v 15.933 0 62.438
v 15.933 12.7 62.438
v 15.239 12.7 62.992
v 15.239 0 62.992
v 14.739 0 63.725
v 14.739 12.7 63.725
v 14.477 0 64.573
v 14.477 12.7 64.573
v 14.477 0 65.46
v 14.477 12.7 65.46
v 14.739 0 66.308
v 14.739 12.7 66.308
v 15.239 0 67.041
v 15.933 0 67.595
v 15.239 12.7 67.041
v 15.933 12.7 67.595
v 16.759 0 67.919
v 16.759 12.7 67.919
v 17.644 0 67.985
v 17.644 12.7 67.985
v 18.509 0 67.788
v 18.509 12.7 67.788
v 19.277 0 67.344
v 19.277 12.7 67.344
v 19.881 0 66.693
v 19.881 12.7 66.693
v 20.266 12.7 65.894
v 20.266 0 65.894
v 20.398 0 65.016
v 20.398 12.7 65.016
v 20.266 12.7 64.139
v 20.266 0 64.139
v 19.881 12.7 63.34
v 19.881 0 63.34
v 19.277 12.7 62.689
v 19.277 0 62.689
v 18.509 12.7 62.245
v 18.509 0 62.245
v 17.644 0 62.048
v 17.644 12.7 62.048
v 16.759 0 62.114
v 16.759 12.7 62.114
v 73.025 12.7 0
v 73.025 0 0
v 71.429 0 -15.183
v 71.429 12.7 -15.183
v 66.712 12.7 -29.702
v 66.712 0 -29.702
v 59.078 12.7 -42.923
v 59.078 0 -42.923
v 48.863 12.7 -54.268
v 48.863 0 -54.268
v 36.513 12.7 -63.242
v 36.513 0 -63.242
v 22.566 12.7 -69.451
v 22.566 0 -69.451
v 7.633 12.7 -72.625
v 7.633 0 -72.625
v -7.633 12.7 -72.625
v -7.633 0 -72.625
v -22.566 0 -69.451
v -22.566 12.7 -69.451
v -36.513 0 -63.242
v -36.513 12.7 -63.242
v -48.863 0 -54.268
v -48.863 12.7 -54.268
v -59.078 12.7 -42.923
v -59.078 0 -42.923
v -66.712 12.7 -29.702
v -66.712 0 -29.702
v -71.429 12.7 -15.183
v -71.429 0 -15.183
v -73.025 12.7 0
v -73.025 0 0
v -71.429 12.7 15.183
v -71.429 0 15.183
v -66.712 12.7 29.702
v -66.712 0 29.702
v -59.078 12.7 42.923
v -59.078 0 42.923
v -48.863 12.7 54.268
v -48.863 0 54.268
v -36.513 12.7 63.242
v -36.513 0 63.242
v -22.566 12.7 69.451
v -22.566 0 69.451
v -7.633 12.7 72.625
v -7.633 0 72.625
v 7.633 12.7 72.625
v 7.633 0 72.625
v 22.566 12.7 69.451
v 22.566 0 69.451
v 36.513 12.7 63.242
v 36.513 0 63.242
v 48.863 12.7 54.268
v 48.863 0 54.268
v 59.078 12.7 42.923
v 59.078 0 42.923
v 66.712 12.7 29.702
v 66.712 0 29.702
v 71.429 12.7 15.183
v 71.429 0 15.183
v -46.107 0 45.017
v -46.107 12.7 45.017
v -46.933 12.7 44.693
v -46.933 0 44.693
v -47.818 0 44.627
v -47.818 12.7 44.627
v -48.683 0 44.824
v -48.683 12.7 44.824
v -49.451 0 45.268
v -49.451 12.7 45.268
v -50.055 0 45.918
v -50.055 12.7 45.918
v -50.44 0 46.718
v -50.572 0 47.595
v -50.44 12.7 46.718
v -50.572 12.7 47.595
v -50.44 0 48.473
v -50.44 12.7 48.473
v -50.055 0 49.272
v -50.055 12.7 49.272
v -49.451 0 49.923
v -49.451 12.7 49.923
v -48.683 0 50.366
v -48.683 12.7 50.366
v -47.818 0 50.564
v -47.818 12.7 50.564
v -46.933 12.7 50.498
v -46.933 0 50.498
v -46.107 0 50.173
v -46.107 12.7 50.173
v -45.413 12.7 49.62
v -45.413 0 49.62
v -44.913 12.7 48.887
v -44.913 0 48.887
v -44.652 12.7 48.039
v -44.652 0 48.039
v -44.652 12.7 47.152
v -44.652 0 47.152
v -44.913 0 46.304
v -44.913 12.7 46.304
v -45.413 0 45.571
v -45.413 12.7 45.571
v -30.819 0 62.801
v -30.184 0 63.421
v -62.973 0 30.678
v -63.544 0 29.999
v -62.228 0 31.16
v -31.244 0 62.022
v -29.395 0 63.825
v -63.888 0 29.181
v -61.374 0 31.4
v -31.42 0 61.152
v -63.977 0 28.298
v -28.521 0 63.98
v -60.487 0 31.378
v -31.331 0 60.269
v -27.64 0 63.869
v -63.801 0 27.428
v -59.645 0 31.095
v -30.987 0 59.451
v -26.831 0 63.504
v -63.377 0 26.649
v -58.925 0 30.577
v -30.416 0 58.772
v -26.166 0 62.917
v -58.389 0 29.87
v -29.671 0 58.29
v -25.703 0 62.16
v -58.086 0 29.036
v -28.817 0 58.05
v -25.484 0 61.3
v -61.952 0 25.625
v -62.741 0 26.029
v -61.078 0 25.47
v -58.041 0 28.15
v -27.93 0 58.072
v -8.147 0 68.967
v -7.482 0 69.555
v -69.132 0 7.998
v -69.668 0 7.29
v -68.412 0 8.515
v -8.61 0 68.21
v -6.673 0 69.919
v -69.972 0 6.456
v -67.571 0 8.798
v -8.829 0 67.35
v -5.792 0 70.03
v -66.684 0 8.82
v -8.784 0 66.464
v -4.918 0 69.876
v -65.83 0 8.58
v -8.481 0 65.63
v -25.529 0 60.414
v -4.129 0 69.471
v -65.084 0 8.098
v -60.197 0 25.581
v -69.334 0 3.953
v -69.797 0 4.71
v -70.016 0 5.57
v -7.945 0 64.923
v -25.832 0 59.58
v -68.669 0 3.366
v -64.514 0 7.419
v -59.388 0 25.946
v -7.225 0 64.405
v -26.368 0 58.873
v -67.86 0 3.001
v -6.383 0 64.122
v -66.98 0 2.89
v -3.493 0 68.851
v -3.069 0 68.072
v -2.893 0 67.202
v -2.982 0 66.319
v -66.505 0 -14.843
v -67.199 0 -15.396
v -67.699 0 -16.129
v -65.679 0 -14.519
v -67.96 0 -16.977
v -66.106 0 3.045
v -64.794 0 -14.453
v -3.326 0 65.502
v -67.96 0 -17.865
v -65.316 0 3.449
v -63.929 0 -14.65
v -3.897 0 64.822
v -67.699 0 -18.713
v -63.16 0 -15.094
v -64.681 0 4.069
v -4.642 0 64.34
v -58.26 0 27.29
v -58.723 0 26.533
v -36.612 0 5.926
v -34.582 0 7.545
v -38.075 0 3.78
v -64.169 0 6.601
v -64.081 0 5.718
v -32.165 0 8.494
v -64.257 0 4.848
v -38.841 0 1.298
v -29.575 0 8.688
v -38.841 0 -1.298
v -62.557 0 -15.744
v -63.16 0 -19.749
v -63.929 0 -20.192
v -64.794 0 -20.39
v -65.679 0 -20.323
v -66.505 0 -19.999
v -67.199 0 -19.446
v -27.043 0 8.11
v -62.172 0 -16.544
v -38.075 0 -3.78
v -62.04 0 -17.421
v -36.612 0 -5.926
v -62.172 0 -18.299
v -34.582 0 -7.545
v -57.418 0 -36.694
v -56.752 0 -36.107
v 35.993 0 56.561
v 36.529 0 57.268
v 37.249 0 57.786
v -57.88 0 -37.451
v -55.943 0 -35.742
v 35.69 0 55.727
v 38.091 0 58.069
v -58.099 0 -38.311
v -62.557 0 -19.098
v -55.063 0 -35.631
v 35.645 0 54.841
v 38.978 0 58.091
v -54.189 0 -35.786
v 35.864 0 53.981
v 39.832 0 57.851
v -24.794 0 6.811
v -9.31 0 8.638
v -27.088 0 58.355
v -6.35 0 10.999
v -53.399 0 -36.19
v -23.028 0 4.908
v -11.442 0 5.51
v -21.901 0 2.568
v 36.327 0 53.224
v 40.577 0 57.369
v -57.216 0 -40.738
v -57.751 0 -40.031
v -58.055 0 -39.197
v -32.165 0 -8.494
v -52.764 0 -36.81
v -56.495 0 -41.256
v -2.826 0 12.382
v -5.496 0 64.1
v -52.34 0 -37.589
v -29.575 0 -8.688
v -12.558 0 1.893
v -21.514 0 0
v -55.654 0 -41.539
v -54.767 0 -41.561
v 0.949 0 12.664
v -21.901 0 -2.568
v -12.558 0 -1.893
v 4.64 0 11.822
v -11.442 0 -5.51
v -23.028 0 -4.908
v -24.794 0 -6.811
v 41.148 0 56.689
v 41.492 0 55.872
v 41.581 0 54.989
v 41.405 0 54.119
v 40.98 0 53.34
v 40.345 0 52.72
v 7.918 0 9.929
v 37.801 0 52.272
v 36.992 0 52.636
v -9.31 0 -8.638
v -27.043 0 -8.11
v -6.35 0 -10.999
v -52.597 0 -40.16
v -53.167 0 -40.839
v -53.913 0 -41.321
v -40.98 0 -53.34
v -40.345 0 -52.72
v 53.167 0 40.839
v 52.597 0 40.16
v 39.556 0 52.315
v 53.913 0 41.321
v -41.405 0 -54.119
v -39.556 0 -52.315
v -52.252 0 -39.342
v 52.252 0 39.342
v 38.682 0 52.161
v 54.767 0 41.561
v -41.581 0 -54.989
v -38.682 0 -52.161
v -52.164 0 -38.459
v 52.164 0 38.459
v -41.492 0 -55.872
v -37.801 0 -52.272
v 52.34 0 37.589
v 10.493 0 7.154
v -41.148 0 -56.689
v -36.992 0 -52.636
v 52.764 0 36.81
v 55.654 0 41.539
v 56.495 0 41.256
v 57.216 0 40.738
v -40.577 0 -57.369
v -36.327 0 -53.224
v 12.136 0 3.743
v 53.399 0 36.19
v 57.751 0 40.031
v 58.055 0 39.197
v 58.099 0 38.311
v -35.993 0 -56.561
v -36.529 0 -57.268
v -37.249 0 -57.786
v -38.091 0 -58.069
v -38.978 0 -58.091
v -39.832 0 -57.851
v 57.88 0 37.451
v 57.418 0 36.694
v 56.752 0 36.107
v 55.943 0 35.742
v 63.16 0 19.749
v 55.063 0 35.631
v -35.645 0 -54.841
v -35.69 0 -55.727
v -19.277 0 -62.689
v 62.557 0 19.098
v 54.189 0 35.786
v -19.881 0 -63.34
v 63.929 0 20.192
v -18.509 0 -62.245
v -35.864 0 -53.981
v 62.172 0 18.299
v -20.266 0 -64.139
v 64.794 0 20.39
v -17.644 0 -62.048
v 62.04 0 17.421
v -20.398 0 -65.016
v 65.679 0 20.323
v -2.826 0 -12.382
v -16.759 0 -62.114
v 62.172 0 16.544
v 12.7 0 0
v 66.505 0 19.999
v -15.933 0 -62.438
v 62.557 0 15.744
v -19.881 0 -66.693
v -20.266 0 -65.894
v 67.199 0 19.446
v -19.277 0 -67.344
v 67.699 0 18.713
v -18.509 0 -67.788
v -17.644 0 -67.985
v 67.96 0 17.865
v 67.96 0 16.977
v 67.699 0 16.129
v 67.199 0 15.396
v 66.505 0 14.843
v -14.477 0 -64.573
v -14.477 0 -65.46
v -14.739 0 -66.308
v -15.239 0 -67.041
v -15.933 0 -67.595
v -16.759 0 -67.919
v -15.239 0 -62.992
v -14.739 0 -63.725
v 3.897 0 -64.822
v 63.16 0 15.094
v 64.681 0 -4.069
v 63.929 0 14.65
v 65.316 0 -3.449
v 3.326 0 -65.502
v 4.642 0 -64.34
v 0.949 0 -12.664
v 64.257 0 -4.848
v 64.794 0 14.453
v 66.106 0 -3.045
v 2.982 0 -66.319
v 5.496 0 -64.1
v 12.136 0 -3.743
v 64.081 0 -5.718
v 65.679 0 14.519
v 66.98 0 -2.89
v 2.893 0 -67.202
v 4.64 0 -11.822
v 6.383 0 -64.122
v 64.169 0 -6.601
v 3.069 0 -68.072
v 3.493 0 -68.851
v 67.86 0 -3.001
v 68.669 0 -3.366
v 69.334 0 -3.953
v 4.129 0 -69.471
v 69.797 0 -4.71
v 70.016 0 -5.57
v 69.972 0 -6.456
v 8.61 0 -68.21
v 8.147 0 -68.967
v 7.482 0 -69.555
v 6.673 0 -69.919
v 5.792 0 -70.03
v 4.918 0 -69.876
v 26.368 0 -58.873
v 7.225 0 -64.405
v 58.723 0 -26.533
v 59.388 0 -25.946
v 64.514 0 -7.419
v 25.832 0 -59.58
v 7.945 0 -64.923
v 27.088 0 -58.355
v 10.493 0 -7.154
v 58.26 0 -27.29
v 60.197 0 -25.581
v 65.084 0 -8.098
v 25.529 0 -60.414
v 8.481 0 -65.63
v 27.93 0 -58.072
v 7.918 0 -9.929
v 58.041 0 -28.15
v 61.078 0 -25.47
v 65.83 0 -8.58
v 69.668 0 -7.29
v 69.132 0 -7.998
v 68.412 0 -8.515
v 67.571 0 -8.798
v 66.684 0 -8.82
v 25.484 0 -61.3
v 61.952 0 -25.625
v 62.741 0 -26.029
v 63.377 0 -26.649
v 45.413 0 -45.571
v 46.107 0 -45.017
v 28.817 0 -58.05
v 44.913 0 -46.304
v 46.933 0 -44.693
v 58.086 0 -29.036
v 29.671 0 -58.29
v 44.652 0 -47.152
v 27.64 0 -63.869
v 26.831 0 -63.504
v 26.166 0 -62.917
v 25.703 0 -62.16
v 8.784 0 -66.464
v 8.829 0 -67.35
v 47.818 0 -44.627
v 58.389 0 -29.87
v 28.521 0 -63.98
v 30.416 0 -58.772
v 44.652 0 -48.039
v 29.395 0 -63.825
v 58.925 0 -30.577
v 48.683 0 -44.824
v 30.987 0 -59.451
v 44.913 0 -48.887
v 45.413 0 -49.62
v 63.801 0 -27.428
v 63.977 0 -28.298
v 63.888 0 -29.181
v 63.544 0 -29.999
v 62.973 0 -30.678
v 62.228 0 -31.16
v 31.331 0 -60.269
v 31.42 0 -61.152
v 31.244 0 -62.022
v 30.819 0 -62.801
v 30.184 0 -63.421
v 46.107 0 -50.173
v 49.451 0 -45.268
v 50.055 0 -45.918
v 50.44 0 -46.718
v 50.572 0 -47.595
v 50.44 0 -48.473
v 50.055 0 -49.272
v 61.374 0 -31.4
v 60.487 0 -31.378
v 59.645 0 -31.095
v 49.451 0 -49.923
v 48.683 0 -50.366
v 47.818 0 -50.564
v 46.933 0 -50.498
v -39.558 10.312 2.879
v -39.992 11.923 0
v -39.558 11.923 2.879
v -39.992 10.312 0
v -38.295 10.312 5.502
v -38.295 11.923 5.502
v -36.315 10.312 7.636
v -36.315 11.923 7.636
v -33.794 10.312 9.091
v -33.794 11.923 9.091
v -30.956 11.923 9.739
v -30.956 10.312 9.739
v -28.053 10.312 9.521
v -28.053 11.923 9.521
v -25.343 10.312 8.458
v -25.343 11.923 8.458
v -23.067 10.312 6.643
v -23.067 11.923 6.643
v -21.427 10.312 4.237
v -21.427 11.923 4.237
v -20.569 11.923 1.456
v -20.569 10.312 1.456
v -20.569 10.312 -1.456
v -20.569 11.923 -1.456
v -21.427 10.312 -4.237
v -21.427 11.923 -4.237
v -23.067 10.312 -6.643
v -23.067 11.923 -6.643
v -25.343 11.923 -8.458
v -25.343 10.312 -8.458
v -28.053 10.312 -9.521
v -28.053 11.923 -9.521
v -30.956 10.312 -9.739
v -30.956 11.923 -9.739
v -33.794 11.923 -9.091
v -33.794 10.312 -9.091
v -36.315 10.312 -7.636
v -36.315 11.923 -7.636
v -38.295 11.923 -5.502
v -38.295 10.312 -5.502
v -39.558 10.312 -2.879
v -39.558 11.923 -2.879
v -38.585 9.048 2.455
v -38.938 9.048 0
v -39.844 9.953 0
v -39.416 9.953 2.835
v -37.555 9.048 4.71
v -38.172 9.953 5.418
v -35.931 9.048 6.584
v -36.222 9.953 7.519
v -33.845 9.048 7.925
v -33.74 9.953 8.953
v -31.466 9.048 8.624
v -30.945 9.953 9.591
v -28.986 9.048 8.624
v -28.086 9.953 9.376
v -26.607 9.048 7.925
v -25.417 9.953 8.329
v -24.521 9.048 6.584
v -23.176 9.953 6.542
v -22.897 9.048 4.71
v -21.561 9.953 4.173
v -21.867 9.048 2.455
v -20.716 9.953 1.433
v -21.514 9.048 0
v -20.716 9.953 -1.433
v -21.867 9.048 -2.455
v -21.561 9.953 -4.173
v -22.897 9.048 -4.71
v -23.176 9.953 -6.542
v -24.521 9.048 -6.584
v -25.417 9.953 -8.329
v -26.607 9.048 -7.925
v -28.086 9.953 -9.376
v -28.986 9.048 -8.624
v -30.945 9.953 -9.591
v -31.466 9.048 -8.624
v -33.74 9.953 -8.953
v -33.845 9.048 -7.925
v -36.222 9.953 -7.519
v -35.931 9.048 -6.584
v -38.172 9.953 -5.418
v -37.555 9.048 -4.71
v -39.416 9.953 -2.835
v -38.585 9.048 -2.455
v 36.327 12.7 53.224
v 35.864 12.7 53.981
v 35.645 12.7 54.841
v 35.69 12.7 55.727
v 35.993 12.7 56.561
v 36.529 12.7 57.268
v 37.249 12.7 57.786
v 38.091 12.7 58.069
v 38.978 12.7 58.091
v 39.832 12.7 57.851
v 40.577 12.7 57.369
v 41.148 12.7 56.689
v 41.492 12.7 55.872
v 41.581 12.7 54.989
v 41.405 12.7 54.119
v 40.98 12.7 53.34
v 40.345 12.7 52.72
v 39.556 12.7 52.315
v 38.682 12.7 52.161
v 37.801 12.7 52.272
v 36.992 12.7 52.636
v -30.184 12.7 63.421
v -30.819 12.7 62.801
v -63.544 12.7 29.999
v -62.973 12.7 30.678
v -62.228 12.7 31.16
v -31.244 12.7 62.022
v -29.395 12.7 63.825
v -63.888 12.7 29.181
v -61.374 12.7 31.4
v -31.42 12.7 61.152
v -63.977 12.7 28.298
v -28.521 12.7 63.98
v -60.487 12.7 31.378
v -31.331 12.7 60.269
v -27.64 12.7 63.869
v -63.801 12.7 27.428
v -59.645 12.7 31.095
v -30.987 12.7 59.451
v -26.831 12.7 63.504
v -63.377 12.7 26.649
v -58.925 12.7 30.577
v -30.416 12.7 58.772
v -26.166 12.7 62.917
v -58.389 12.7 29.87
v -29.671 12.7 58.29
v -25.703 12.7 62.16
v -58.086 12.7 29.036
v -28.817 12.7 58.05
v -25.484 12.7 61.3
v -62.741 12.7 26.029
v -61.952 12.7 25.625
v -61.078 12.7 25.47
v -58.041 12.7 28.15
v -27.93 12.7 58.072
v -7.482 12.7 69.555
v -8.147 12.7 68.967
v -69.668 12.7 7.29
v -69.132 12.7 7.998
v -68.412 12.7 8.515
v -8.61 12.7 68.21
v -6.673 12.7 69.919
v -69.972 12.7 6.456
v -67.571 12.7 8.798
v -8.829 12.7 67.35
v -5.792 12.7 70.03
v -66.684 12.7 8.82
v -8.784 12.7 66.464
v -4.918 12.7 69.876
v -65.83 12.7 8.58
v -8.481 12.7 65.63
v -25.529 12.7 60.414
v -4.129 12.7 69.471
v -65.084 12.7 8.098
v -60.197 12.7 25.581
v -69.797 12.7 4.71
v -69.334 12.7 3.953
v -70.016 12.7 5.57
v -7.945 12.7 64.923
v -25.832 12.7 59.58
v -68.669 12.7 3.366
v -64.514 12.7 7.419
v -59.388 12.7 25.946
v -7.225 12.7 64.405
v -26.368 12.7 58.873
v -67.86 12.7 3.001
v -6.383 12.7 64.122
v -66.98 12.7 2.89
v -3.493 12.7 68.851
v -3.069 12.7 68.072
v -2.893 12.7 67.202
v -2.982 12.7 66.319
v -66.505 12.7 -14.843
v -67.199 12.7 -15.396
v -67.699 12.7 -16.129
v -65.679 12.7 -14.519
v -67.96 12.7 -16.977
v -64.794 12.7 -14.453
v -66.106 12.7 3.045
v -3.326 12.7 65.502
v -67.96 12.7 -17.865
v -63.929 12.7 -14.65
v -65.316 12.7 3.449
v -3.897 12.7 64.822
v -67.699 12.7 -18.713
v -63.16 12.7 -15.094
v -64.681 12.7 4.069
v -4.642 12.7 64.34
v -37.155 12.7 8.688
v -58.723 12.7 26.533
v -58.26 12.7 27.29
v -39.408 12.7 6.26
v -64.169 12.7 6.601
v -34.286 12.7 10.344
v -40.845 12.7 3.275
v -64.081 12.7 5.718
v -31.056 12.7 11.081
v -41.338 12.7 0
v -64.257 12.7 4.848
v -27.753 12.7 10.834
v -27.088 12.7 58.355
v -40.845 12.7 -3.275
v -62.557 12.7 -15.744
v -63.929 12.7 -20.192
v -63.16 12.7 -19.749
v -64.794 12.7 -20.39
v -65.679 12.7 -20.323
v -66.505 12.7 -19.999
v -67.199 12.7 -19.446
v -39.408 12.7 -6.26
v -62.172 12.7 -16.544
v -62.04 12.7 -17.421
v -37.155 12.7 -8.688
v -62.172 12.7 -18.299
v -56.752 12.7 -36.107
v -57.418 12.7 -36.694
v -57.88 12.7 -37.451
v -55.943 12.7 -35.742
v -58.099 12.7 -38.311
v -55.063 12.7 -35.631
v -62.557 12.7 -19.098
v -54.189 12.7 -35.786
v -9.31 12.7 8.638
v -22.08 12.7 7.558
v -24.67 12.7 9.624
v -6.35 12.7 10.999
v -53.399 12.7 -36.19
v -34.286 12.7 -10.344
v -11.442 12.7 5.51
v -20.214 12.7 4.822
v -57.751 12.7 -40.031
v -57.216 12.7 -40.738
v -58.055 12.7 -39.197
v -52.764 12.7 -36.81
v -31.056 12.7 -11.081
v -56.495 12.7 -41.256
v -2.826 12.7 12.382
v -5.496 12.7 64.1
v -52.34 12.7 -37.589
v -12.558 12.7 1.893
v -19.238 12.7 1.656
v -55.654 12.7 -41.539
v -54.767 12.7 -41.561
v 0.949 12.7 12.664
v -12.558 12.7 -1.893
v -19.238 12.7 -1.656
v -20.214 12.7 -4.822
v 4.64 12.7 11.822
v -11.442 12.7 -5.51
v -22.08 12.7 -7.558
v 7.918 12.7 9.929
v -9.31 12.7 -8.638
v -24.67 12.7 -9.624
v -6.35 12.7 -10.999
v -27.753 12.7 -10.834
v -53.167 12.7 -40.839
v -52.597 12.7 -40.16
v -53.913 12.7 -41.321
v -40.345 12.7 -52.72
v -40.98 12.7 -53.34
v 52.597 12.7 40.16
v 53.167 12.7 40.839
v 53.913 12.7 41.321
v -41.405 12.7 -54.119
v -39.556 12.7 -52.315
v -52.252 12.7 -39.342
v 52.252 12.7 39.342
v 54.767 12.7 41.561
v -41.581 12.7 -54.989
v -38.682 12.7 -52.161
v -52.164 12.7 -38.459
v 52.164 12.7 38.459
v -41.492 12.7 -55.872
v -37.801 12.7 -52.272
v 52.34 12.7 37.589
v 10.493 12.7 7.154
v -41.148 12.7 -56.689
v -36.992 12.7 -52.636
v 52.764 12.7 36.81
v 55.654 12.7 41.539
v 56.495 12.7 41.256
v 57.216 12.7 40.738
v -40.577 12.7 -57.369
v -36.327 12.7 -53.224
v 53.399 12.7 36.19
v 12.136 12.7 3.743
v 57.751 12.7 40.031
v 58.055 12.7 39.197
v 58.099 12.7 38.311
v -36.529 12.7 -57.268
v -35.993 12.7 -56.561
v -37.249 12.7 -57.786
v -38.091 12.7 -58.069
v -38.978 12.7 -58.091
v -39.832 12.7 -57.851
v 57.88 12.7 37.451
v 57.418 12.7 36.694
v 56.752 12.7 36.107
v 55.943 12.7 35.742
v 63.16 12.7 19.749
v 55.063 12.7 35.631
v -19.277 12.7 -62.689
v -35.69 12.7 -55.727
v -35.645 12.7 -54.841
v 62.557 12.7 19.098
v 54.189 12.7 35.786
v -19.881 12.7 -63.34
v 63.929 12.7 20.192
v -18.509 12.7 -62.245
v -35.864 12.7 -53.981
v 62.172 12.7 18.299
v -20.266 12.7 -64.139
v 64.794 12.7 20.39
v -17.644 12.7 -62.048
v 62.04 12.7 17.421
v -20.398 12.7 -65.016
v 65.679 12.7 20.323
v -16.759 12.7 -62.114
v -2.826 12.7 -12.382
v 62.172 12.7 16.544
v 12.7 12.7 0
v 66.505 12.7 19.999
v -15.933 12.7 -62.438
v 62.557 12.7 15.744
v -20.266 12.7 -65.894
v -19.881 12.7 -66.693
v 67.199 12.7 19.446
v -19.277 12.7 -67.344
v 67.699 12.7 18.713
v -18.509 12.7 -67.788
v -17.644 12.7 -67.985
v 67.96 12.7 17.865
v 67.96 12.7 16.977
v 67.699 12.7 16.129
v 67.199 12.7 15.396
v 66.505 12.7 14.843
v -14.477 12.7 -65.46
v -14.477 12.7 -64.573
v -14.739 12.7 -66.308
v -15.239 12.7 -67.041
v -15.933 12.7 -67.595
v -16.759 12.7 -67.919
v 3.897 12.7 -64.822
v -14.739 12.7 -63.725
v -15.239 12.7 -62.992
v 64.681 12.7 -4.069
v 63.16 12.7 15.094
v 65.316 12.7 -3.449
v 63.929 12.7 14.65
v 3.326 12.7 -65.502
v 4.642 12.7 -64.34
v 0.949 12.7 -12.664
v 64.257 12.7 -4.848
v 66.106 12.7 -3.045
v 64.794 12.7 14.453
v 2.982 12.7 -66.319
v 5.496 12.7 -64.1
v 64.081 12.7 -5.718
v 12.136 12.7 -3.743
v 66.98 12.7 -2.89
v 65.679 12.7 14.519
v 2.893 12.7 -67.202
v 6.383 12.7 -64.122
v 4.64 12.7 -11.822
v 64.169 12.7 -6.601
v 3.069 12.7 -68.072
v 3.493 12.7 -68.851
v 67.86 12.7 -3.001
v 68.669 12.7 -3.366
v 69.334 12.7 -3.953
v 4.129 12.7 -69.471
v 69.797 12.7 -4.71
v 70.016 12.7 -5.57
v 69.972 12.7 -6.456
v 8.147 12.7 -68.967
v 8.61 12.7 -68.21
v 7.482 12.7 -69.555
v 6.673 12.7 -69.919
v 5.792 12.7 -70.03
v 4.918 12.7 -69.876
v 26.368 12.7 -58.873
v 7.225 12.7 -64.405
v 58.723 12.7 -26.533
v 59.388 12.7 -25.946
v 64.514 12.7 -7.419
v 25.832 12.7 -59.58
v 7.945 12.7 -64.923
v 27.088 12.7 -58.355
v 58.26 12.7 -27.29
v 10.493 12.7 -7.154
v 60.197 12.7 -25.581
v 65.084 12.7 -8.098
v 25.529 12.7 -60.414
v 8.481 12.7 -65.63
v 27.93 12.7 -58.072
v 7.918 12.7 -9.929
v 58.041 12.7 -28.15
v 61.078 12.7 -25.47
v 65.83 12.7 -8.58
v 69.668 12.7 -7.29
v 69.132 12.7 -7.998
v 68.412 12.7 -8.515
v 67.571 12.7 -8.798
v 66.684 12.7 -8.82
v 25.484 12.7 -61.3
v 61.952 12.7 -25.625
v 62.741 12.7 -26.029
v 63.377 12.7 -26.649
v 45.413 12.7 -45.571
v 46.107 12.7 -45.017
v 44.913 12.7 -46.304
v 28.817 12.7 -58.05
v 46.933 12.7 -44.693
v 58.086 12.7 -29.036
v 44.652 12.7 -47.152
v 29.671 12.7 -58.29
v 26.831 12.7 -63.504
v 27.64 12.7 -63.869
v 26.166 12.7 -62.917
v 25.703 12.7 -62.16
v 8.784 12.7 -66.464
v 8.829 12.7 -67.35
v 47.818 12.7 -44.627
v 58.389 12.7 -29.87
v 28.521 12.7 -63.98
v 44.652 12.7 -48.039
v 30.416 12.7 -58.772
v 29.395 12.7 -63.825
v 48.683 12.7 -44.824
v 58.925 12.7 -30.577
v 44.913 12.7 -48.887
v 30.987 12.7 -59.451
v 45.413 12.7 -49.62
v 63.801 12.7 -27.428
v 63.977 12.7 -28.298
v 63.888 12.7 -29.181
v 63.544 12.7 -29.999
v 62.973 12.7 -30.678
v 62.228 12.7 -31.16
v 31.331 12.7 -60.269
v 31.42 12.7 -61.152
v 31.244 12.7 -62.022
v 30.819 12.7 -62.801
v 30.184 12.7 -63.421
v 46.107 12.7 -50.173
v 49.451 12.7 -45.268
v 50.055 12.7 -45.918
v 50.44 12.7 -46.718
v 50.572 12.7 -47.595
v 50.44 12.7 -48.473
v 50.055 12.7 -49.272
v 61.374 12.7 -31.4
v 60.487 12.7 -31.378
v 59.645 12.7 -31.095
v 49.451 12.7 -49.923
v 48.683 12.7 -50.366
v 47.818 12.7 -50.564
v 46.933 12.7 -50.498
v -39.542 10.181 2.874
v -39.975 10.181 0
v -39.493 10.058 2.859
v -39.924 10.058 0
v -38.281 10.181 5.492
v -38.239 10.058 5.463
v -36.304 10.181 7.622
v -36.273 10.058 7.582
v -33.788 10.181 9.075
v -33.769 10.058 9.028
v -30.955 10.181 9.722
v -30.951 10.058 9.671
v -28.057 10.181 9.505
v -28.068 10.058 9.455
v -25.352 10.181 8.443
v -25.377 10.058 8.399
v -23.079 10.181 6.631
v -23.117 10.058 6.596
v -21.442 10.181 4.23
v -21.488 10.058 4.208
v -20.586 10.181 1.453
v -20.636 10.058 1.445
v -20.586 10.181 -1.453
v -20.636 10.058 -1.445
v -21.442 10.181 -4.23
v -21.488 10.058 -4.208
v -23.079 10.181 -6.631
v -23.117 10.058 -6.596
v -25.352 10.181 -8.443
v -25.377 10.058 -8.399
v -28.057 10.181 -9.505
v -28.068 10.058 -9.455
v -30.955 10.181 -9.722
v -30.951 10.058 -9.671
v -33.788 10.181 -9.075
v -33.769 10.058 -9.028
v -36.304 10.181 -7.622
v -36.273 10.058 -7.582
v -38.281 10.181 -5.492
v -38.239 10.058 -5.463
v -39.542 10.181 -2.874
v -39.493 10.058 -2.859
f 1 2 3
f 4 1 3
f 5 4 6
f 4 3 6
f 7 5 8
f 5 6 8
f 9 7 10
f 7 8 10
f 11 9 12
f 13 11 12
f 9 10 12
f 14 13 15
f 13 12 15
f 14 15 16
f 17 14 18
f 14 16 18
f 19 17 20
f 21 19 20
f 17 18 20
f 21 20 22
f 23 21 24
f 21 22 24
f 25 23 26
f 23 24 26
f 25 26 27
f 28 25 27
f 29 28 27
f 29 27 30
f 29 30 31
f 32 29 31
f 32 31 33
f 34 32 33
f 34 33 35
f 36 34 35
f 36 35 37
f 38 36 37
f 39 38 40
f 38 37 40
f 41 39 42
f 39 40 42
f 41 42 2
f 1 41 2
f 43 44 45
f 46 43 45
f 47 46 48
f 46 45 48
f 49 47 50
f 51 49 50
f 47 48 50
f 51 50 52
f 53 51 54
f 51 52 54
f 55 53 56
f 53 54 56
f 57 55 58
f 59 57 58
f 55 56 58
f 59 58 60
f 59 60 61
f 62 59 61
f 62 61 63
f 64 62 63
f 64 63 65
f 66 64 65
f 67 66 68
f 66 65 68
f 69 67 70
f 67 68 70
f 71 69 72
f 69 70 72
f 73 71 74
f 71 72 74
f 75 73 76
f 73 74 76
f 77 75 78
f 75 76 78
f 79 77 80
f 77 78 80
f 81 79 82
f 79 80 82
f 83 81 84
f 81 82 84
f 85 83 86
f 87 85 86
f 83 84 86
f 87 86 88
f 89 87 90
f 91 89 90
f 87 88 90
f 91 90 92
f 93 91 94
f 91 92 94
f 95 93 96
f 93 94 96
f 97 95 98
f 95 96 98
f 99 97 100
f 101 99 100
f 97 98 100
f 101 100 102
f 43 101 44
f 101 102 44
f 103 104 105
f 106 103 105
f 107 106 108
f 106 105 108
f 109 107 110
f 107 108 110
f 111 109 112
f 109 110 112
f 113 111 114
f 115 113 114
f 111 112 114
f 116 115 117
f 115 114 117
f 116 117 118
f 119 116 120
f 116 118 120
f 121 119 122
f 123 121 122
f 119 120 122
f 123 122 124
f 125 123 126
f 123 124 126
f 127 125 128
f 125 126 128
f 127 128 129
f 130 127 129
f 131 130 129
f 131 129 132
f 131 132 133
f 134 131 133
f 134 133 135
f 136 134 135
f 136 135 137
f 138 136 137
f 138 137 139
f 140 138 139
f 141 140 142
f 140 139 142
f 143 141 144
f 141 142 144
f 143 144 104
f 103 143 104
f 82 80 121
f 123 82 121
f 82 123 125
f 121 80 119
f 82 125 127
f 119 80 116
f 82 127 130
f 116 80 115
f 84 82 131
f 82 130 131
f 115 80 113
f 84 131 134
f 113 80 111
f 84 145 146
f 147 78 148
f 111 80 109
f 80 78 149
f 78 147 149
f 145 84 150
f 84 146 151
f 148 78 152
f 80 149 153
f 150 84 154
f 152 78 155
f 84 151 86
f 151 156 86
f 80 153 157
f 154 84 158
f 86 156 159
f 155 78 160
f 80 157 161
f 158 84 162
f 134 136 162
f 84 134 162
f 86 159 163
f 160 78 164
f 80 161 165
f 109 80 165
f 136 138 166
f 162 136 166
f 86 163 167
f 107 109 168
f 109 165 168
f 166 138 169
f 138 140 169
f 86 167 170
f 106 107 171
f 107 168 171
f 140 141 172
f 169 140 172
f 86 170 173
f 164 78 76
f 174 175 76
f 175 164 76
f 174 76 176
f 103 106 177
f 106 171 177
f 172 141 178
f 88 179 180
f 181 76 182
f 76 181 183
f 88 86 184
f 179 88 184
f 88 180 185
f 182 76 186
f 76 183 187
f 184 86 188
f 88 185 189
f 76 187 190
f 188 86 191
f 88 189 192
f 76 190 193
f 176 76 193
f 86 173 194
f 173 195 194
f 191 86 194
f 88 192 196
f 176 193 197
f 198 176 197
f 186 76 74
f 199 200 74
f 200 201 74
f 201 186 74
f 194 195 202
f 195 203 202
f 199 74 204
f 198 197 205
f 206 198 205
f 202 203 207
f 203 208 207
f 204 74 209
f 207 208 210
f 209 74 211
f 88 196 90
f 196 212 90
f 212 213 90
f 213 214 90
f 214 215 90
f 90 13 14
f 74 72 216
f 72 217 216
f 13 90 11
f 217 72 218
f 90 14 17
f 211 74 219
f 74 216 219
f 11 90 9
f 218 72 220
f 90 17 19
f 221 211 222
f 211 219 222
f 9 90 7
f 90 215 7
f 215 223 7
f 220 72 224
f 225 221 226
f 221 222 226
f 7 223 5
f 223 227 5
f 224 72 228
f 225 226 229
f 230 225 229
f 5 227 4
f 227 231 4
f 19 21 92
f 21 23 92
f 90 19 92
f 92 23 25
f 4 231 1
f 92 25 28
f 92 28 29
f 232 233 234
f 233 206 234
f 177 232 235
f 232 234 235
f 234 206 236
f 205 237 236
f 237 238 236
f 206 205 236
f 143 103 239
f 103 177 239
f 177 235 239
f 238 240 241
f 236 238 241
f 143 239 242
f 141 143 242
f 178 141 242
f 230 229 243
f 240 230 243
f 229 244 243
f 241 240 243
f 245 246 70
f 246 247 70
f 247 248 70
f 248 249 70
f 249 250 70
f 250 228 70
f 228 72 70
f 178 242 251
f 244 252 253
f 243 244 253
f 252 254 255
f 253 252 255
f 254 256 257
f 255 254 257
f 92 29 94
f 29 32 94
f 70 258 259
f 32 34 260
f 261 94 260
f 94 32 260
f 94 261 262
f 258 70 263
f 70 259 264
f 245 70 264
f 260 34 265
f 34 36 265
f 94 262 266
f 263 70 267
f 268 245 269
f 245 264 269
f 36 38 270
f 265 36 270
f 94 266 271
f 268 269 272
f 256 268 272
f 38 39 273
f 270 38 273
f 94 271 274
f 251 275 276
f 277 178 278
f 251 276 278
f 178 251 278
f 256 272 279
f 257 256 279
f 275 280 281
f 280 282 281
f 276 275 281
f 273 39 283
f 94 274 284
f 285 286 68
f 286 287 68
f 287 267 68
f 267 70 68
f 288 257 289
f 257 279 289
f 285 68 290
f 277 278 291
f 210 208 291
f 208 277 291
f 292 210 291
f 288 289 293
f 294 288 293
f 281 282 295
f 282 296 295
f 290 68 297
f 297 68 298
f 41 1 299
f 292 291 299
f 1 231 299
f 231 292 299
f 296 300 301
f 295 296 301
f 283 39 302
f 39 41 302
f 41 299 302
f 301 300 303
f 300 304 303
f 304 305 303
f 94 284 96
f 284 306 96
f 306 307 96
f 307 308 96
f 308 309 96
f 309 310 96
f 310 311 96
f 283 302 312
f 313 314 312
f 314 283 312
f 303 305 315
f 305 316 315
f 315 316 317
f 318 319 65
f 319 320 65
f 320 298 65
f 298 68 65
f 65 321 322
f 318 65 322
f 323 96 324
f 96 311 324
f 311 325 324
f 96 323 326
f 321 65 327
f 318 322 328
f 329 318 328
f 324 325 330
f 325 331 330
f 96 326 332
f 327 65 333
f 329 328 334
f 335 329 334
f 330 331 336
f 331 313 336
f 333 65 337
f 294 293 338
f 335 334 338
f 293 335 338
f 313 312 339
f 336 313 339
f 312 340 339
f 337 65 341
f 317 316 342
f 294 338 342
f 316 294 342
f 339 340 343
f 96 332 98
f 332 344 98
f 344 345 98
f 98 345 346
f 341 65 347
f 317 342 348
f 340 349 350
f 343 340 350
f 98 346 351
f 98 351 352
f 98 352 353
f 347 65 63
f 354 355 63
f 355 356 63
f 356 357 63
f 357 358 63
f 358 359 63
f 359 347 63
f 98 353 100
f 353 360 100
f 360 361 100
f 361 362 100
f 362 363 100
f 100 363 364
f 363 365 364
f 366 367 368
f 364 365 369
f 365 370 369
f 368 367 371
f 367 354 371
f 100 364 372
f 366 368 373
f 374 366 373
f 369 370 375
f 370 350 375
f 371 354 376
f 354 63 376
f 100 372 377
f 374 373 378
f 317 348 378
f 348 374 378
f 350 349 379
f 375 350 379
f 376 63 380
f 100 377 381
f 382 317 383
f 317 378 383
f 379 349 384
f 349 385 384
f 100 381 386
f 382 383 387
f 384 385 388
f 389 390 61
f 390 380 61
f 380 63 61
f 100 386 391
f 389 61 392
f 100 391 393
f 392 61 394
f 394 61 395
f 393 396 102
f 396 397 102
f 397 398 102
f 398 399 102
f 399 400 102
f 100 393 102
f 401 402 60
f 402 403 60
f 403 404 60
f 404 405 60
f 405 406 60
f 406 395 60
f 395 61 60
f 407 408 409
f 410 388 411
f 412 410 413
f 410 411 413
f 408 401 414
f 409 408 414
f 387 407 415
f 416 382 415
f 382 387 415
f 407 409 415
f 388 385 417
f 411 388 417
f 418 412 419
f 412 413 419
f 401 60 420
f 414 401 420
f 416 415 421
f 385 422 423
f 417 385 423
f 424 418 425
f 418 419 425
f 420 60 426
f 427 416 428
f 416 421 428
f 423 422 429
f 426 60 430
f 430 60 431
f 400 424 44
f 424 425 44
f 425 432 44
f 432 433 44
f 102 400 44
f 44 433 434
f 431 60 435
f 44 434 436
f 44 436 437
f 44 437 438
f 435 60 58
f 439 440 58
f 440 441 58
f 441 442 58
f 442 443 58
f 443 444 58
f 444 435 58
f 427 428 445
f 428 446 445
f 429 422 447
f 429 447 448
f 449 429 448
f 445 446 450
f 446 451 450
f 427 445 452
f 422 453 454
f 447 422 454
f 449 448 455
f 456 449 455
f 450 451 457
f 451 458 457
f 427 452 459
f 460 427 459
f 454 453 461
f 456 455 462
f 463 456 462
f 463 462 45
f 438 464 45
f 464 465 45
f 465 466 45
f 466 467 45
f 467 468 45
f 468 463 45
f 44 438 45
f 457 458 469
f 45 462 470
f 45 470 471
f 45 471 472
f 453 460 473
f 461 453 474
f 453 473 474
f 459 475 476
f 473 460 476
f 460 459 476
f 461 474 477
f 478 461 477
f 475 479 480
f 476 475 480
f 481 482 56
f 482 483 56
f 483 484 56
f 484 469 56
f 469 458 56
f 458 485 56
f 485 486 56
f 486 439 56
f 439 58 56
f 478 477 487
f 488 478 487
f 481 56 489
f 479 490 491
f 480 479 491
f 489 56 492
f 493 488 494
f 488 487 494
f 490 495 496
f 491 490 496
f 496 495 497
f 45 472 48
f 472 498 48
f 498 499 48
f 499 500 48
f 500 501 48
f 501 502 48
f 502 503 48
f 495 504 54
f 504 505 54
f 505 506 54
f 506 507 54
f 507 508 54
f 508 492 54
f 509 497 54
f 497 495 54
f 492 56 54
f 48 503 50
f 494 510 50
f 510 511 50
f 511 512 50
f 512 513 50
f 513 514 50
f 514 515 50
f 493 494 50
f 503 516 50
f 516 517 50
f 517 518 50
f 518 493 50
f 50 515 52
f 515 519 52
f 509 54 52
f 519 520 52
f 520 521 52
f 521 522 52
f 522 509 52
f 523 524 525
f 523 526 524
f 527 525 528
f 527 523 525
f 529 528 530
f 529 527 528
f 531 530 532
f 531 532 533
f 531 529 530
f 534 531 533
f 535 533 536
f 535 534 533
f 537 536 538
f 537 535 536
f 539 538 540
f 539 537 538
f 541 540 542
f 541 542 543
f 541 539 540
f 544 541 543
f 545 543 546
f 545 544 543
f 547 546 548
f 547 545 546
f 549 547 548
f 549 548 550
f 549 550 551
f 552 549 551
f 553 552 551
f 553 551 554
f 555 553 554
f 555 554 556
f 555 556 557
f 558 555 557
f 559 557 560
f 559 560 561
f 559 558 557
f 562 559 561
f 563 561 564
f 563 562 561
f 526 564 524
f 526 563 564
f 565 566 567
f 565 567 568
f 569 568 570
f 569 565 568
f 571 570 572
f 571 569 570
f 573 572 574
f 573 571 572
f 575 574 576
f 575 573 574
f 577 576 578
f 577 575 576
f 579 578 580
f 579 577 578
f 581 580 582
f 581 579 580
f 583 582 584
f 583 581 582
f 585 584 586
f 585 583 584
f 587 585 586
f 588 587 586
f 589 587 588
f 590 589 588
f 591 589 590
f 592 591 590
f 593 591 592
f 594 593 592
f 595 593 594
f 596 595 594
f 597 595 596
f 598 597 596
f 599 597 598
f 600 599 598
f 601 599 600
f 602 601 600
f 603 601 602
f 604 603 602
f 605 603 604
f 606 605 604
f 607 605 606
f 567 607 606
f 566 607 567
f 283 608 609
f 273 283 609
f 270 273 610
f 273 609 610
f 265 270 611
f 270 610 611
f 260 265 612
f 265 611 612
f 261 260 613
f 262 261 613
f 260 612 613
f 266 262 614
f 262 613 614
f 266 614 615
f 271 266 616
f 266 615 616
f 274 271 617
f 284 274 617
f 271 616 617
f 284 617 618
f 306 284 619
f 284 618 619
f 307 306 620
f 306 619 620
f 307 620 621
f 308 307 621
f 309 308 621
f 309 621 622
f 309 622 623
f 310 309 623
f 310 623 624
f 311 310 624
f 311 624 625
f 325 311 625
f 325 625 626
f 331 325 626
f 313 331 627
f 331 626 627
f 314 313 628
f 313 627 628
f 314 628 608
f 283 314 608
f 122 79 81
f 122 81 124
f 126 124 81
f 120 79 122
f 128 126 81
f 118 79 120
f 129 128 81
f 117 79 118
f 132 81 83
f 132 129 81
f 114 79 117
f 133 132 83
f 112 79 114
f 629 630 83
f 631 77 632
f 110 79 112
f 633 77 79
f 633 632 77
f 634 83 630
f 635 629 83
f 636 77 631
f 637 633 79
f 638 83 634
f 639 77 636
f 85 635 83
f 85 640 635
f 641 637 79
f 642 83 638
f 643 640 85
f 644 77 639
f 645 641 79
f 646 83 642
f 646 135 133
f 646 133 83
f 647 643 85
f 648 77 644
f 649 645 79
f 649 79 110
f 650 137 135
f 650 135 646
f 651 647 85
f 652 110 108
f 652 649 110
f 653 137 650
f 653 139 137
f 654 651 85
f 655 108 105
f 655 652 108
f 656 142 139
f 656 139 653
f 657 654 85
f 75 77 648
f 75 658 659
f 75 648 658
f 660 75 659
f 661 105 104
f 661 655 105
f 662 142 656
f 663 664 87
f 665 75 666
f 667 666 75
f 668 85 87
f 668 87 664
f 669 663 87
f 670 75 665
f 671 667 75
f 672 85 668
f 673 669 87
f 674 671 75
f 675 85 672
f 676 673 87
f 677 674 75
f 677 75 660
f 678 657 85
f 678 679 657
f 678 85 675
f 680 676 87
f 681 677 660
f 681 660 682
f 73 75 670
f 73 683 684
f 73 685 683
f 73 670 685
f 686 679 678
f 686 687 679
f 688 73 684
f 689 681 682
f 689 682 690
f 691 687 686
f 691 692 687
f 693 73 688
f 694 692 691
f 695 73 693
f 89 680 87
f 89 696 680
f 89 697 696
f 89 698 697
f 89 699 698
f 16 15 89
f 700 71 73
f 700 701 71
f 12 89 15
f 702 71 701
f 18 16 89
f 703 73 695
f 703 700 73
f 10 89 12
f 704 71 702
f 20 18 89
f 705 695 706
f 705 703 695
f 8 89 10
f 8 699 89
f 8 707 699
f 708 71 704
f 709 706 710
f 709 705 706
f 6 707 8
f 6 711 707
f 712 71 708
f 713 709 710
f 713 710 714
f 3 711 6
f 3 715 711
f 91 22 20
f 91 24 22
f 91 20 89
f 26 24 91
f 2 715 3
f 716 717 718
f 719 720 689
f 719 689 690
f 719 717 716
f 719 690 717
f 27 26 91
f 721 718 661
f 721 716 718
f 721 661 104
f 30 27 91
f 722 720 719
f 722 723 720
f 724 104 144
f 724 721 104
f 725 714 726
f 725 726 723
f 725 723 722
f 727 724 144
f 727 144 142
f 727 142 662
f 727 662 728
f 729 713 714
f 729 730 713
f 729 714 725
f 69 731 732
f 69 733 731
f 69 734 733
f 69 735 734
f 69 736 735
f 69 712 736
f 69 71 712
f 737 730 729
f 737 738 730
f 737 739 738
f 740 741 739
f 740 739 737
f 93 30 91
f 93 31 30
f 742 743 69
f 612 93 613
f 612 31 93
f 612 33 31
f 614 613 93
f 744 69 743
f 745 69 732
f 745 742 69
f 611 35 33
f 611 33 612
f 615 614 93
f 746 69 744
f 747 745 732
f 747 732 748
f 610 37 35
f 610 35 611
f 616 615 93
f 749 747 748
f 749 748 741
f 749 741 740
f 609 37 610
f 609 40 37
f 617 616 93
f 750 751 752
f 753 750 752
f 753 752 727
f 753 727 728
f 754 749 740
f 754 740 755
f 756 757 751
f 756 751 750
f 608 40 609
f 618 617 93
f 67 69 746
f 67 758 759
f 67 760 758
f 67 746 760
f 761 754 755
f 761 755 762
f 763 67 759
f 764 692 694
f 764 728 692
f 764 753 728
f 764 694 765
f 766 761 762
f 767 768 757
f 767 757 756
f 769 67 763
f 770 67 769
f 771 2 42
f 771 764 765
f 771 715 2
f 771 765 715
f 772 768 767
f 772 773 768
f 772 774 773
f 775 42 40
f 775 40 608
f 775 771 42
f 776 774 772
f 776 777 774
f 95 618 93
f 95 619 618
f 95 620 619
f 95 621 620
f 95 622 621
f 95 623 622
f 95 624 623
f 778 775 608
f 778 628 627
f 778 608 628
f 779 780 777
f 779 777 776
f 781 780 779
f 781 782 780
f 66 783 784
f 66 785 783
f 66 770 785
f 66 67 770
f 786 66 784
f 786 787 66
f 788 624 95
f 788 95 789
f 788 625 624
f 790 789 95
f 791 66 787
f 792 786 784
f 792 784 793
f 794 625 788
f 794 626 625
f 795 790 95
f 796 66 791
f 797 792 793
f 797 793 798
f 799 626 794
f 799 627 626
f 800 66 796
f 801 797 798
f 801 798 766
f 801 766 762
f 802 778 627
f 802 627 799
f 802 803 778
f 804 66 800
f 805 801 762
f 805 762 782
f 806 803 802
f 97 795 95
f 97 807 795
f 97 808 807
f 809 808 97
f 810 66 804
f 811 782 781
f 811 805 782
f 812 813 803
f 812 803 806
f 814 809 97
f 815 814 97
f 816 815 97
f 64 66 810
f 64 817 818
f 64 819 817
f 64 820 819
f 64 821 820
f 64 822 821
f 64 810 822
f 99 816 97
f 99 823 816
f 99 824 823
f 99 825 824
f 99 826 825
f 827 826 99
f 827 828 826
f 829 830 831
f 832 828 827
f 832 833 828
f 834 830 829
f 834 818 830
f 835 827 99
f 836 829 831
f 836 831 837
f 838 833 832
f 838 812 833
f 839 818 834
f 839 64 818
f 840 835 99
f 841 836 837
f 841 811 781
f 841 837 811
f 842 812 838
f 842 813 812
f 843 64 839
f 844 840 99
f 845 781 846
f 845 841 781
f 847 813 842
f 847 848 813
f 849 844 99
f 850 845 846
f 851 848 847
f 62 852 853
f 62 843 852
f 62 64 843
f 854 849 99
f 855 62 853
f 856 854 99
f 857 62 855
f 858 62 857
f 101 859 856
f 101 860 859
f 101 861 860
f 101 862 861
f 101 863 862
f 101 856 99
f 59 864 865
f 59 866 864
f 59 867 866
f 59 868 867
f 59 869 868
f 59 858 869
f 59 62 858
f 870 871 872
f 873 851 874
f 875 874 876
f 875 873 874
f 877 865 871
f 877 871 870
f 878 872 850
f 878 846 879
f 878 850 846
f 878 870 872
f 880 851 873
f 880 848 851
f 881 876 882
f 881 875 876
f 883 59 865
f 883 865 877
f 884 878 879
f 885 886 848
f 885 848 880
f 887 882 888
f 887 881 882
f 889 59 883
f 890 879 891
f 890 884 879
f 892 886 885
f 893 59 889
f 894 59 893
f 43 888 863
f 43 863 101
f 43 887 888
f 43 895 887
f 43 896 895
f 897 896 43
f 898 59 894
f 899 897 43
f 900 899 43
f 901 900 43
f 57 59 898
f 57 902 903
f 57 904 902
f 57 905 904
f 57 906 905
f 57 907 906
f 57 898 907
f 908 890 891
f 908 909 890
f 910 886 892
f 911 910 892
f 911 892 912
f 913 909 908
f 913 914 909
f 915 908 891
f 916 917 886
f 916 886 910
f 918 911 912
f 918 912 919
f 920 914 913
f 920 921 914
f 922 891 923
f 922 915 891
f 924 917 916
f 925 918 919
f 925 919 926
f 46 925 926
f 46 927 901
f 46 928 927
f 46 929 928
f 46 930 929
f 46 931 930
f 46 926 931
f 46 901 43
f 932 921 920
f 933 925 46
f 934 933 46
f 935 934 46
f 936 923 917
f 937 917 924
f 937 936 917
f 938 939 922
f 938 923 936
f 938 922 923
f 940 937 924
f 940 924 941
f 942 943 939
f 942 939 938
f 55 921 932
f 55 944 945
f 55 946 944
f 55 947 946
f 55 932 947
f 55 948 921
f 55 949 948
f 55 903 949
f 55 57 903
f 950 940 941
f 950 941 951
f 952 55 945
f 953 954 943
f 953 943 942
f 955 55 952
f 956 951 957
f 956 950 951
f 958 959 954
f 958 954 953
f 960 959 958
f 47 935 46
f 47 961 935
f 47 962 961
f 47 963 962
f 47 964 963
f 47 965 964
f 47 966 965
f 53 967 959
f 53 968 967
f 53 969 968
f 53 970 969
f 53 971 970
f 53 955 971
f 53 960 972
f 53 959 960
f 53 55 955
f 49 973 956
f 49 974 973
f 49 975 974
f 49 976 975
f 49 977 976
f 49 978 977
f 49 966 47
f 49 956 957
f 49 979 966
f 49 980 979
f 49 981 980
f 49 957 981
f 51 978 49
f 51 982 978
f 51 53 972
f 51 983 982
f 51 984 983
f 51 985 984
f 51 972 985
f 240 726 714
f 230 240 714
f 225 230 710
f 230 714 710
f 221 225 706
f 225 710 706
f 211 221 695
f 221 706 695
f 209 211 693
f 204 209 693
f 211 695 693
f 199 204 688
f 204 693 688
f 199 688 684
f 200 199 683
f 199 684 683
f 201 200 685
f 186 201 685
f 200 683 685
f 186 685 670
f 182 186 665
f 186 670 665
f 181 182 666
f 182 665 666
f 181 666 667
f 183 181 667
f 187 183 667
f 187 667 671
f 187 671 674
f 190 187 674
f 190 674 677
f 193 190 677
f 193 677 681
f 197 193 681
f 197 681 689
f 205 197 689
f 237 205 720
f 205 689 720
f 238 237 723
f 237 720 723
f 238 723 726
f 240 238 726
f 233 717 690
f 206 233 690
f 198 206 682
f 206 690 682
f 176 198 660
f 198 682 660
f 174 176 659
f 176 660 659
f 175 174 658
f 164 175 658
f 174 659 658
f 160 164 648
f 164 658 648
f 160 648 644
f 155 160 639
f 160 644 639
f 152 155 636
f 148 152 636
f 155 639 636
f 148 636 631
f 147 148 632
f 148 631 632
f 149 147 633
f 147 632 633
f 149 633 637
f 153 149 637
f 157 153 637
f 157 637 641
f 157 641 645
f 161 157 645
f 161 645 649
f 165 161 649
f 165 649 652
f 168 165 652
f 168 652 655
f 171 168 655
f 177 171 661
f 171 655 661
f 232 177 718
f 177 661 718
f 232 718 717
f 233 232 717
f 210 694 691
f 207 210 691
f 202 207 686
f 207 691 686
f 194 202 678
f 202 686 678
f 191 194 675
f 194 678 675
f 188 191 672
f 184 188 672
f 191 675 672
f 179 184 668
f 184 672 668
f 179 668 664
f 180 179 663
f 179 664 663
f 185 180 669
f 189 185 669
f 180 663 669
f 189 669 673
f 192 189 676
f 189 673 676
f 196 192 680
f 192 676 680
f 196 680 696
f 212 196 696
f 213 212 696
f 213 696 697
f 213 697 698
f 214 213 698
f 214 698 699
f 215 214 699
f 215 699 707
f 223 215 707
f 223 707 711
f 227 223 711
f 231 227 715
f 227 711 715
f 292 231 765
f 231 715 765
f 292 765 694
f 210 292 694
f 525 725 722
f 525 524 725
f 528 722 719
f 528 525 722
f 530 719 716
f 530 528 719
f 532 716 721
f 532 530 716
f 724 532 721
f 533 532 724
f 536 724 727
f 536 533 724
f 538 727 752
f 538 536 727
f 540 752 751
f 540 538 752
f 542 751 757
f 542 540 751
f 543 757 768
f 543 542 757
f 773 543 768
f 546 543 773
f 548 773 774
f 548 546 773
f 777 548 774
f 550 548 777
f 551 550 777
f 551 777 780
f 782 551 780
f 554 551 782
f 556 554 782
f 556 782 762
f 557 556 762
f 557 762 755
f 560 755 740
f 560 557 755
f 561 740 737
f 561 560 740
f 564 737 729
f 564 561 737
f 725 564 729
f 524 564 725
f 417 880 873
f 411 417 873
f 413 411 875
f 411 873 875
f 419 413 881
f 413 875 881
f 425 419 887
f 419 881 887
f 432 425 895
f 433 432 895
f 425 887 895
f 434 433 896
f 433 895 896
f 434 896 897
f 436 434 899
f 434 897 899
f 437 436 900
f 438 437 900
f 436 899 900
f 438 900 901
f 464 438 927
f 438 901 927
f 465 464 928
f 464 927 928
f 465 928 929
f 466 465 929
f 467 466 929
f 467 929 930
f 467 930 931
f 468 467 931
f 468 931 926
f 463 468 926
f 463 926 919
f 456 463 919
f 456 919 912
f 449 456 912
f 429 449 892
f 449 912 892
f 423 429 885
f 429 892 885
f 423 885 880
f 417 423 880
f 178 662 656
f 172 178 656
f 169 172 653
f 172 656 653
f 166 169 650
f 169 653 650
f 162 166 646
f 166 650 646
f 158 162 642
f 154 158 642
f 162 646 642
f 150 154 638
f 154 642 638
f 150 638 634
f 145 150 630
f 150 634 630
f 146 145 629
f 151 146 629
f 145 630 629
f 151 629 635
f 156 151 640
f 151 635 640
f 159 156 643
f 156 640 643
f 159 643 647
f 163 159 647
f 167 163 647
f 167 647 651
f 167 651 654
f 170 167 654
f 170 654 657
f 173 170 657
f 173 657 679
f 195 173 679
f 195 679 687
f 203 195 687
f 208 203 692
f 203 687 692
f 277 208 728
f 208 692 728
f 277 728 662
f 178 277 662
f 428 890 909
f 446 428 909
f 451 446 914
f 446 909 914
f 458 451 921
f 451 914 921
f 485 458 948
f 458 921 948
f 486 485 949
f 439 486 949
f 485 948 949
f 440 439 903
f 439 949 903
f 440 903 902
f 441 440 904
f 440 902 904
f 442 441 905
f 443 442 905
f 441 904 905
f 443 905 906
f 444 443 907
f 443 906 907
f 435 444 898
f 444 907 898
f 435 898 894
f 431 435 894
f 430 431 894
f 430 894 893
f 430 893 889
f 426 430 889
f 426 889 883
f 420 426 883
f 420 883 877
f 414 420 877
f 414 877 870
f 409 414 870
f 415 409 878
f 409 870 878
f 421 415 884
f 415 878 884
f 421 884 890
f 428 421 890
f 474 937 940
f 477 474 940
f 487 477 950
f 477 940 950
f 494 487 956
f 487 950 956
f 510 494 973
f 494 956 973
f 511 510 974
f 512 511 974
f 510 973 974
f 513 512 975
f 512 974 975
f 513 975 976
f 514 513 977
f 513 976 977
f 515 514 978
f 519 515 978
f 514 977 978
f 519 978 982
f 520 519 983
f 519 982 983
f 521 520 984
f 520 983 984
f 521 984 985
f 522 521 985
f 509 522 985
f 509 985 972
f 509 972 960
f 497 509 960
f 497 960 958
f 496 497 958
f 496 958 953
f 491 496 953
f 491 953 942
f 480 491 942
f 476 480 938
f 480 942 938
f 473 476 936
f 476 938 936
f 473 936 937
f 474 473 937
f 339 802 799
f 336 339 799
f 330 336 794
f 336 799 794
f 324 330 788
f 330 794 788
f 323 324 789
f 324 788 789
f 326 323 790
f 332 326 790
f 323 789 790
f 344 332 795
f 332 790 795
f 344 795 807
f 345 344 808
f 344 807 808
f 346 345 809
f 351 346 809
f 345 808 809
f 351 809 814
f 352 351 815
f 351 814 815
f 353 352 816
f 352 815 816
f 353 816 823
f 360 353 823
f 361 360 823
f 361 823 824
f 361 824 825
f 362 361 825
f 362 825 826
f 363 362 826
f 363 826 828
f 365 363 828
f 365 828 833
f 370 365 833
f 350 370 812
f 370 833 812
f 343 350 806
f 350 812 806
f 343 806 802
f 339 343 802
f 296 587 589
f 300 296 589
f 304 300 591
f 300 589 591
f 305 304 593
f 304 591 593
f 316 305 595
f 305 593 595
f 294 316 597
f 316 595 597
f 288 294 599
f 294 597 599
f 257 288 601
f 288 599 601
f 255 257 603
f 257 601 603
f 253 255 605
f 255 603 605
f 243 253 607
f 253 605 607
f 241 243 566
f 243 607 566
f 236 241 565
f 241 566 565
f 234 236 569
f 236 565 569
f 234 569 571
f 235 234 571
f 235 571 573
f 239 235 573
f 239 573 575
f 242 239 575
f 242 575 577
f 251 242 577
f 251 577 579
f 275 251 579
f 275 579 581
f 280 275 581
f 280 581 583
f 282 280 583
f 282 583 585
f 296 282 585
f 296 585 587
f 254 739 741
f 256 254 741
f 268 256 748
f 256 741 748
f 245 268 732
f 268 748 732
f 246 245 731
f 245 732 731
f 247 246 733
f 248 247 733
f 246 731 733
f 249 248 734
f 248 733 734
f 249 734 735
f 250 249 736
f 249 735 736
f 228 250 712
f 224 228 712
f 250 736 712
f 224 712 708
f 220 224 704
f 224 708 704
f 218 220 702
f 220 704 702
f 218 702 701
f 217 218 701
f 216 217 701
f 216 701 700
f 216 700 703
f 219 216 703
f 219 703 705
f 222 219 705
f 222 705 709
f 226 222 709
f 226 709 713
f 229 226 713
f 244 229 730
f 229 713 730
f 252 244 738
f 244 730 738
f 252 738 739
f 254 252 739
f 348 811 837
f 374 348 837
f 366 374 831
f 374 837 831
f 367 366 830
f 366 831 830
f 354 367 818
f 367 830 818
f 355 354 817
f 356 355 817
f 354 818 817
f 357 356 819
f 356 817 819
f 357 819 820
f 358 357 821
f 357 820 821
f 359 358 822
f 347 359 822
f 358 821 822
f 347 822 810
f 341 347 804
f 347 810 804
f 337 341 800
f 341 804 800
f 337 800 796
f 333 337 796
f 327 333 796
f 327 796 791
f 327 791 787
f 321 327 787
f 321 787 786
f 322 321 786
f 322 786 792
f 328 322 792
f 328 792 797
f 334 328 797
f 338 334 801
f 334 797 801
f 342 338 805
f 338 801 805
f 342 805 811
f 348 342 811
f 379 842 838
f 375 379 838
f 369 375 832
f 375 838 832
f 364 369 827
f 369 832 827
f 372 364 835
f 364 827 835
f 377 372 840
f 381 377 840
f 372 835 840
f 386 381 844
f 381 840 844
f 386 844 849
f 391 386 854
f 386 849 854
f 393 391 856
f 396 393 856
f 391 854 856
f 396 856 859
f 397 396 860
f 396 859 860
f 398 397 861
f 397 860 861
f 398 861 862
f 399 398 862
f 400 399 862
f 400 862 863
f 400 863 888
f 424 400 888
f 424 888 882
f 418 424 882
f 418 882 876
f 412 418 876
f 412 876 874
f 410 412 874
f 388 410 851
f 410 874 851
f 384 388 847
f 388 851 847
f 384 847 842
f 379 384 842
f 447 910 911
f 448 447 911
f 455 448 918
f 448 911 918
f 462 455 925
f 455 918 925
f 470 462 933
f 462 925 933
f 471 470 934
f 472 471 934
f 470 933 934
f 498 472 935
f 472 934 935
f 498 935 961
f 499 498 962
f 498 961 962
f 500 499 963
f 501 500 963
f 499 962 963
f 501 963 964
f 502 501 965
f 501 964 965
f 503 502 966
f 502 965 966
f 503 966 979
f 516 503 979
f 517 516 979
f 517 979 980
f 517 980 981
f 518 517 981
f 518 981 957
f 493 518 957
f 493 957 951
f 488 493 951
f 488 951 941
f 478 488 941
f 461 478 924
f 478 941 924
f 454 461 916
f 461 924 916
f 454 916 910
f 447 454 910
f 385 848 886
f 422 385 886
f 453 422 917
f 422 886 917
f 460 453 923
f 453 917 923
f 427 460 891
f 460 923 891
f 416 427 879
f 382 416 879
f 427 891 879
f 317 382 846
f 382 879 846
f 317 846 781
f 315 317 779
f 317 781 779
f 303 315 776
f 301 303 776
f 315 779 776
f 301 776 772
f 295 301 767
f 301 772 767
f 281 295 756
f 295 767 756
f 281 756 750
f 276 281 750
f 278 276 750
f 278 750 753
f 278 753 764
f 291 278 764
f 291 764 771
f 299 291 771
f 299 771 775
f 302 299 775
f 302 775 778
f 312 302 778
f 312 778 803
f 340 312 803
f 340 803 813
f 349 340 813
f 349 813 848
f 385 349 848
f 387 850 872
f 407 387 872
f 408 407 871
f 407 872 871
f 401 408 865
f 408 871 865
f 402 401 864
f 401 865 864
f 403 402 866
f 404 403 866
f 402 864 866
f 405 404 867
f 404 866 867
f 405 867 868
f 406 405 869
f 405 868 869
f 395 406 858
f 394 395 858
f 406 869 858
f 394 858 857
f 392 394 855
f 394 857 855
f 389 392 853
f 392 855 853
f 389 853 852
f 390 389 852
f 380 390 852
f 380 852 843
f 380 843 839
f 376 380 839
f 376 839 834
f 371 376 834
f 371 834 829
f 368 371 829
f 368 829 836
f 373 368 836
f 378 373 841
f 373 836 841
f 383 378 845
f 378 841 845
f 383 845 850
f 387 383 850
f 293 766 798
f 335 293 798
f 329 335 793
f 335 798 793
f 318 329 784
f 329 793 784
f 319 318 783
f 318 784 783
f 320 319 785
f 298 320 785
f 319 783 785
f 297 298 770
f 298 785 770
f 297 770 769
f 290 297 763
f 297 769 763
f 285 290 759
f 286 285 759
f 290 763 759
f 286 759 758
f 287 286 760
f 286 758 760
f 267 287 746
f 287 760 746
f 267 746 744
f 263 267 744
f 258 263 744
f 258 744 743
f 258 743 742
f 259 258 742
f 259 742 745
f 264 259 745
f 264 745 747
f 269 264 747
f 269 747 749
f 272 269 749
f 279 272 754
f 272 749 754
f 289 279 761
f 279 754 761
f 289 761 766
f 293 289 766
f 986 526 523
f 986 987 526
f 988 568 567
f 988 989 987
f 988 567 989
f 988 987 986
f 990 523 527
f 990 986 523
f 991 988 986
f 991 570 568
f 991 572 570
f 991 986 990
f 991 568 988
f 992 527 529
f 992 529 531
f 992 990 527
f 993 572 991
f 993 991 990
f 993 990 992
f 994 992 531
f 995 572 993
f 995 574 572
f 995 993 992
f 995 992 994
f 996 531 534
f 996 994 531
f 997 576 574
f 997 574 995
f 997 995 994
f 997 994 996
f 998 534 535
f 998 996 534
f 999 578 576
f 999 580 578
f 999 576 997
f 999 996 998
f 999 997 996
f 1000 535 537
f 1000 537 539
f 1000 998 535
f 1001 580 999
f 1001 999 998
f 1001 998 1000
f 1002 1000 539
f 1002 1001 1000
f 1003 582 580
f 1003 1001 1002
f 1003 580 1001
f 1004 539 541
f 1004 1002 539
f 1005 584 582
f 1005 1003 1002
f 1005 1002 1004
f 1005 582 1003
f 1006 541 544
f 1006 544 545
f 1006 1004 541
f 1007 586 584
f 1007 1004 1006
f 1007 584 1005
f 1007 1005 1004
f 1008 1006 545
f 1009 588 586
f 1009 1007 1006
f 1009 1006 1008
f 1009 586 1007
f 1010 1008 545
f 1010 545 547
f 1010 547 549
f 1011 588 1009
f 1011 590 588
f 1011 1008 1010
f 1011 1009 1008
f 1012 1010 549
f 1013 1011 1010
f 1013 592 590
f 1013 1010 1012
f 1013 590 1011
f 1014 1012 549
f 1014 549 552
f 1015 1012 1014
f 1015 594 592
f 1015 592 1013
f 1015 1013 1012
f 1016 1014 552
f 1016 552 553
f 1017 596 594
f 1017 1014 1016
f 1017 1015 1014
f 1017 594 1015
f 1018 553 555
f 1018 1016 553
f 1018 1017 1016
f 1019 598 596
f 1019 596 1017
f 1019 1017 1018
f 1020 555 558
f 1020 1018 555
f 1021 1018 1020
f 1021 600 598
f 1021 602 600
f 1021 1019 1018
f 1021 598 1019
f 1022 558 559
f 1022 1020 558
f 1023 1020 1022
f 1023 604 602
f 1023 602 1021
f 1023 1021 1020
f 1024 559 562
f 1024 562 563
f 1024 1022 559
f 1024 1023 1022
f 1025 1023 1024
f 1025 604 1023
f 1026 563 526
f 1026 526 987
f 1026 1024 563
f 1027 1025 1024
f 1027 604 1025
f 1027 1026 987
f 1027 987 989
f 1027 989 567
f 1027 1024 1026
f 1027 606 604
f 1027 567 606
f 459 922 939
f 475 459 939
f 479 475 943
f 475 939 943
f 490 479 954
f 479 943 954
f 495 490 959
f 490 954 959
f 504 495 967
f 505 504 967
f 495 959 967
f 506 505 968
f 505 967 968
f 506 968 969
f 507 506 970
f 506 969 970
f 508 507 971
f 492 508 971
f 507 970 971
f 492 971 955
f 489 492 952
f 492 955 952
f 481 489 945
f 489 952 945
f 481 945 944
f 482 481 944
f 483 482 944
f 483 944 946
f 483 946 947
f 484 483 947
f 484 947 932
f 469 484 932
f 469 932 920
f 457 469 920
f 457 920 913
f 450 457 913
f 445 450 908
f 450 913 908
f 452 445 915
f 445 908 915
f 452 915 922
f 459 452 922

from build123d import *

# Parameters (mm, degrees)
TOP_PLATE_DIAMETER_R           = 73.025
TOP_PLATE_EXTRUDE_DEPTH        = 12.7
FUEL_PORT_CLEARANCE_DIAMETER_R = 12.7
FUEL_PORT_CLEARANCE_HOLE_DEPTH = 13.7
ASSEMBLY_BOLT_DIAMETER_R       = 2.97688
ASSEMBLY_BOLT_DEPTH            = 12.7
CIRPATTERN1_COUNT              = 18
LOX_PORT_REACH                 = 14.7
SKETCH7_R                      = 8.7122


with BuildPart() as part:
    # Top Plate Diameter → Top Plate Extrude (new body)
    with BuildSketch(Plane(origin=(0, 0, 0), x_dir=(1, 0, 0), z_dir=(0, 1, 0))):
        Circle(TOP_PLATE_DIAMETER_R)
    extrude(amount=TOP_PLATE_EXTRUDE_DEPTH)

    # Fuel Port Clearance Diameter → Fuel Port Clearance Hole (cut, through all)
    with BuildSketch(Plane(origin=(0, 12.7, 0), x_dir=(1, 0, 0), z_dir=(0, 1, 0))):
        Circle(FUEL_PORT_CLEARANCE_DIAMETER_R)
    extrude(amount=-FUEL_PORT_CLEARANCE_HOLE_DEPTH, mode=Mode.SUBTRACT)

    # Assembly Bolt Diameter → Assembly Bolt (cut)
    with BuildSketch(Plane(origin=(0, 12.7, 0), x_dir=(1, 0, 0), z_dir=(0, 1, 0))):
        with Locations((-65.016467368, 17.421109926)):
            Circle(ASSEMBLY_BOLT_DIAMETER_R)
    assembly_bolt = extrude(amount=-ASSEMBLY_BOLT_DEPTH, mode=Mode.SUBTRACT)

    # CirPattern1: Assembly Bolt ×18 about axis
    cirpattern1_axis = Axis((0, 0, 0), (0, 1, 0))
    for i in range(1, CIRPATTERN1_COUNT):
        add(assembly_bolt.rotate(cirpattern1_axis, i * 360 / CIRPATTERN1_COUNT), mode=Mode.SUBTRACT)

    # Sketch7 → LOX Port (cut, up to next)
    with BuildSketch(Plane(origin=(0, 12.7, 0), x_dir=(1, 0, 0), z_dir=(0, 1, 0)), mode=Mode.PRIVATE) as lox_port_sk1:
        with Locations((-30.226, 0)):
            Circle(SKETCH7_R)
    lox_port_tool1 = extrude(lox_port_sk1.sketch, amount=-LOX_PORT_REACH, mode=Mode.PRIVATE) & part.part
    add(lox_port_tool1.solids().sort_by_distance((-30.226, 12.7, 0))[0], mode=Mode.SUBTRACT)

    # Sketch9 → Cut-Revolve1 (revolve, cut)
    with BuildSketch(Plane.XY):
        with BuildLine():
            Line((-41.3385, 12.7), (-39.9923, 11.922771068))
            Line((-39.9923, 11.922771068), (-39.9923, 10.3124))
            ThreePointArc((-39.9923, 10.3124), (-39.953630803, 10.117996816), (-39.843510245, 9.953189755))
            Line((-39.843510245, 9.953189755), (-38.9382, 9.04787951))
            Line((-38.9382, 9.04787951), (-38.9382, 12.7))
            Line((-38.9382, 12.7), (-41.3385, 12.7))
        make_face()
    revolve(axis=Axis((-30.226, -7.468881995, 0), (0, 1, 0)), mode=Mode.SUBTRACT)


solid = part.part
